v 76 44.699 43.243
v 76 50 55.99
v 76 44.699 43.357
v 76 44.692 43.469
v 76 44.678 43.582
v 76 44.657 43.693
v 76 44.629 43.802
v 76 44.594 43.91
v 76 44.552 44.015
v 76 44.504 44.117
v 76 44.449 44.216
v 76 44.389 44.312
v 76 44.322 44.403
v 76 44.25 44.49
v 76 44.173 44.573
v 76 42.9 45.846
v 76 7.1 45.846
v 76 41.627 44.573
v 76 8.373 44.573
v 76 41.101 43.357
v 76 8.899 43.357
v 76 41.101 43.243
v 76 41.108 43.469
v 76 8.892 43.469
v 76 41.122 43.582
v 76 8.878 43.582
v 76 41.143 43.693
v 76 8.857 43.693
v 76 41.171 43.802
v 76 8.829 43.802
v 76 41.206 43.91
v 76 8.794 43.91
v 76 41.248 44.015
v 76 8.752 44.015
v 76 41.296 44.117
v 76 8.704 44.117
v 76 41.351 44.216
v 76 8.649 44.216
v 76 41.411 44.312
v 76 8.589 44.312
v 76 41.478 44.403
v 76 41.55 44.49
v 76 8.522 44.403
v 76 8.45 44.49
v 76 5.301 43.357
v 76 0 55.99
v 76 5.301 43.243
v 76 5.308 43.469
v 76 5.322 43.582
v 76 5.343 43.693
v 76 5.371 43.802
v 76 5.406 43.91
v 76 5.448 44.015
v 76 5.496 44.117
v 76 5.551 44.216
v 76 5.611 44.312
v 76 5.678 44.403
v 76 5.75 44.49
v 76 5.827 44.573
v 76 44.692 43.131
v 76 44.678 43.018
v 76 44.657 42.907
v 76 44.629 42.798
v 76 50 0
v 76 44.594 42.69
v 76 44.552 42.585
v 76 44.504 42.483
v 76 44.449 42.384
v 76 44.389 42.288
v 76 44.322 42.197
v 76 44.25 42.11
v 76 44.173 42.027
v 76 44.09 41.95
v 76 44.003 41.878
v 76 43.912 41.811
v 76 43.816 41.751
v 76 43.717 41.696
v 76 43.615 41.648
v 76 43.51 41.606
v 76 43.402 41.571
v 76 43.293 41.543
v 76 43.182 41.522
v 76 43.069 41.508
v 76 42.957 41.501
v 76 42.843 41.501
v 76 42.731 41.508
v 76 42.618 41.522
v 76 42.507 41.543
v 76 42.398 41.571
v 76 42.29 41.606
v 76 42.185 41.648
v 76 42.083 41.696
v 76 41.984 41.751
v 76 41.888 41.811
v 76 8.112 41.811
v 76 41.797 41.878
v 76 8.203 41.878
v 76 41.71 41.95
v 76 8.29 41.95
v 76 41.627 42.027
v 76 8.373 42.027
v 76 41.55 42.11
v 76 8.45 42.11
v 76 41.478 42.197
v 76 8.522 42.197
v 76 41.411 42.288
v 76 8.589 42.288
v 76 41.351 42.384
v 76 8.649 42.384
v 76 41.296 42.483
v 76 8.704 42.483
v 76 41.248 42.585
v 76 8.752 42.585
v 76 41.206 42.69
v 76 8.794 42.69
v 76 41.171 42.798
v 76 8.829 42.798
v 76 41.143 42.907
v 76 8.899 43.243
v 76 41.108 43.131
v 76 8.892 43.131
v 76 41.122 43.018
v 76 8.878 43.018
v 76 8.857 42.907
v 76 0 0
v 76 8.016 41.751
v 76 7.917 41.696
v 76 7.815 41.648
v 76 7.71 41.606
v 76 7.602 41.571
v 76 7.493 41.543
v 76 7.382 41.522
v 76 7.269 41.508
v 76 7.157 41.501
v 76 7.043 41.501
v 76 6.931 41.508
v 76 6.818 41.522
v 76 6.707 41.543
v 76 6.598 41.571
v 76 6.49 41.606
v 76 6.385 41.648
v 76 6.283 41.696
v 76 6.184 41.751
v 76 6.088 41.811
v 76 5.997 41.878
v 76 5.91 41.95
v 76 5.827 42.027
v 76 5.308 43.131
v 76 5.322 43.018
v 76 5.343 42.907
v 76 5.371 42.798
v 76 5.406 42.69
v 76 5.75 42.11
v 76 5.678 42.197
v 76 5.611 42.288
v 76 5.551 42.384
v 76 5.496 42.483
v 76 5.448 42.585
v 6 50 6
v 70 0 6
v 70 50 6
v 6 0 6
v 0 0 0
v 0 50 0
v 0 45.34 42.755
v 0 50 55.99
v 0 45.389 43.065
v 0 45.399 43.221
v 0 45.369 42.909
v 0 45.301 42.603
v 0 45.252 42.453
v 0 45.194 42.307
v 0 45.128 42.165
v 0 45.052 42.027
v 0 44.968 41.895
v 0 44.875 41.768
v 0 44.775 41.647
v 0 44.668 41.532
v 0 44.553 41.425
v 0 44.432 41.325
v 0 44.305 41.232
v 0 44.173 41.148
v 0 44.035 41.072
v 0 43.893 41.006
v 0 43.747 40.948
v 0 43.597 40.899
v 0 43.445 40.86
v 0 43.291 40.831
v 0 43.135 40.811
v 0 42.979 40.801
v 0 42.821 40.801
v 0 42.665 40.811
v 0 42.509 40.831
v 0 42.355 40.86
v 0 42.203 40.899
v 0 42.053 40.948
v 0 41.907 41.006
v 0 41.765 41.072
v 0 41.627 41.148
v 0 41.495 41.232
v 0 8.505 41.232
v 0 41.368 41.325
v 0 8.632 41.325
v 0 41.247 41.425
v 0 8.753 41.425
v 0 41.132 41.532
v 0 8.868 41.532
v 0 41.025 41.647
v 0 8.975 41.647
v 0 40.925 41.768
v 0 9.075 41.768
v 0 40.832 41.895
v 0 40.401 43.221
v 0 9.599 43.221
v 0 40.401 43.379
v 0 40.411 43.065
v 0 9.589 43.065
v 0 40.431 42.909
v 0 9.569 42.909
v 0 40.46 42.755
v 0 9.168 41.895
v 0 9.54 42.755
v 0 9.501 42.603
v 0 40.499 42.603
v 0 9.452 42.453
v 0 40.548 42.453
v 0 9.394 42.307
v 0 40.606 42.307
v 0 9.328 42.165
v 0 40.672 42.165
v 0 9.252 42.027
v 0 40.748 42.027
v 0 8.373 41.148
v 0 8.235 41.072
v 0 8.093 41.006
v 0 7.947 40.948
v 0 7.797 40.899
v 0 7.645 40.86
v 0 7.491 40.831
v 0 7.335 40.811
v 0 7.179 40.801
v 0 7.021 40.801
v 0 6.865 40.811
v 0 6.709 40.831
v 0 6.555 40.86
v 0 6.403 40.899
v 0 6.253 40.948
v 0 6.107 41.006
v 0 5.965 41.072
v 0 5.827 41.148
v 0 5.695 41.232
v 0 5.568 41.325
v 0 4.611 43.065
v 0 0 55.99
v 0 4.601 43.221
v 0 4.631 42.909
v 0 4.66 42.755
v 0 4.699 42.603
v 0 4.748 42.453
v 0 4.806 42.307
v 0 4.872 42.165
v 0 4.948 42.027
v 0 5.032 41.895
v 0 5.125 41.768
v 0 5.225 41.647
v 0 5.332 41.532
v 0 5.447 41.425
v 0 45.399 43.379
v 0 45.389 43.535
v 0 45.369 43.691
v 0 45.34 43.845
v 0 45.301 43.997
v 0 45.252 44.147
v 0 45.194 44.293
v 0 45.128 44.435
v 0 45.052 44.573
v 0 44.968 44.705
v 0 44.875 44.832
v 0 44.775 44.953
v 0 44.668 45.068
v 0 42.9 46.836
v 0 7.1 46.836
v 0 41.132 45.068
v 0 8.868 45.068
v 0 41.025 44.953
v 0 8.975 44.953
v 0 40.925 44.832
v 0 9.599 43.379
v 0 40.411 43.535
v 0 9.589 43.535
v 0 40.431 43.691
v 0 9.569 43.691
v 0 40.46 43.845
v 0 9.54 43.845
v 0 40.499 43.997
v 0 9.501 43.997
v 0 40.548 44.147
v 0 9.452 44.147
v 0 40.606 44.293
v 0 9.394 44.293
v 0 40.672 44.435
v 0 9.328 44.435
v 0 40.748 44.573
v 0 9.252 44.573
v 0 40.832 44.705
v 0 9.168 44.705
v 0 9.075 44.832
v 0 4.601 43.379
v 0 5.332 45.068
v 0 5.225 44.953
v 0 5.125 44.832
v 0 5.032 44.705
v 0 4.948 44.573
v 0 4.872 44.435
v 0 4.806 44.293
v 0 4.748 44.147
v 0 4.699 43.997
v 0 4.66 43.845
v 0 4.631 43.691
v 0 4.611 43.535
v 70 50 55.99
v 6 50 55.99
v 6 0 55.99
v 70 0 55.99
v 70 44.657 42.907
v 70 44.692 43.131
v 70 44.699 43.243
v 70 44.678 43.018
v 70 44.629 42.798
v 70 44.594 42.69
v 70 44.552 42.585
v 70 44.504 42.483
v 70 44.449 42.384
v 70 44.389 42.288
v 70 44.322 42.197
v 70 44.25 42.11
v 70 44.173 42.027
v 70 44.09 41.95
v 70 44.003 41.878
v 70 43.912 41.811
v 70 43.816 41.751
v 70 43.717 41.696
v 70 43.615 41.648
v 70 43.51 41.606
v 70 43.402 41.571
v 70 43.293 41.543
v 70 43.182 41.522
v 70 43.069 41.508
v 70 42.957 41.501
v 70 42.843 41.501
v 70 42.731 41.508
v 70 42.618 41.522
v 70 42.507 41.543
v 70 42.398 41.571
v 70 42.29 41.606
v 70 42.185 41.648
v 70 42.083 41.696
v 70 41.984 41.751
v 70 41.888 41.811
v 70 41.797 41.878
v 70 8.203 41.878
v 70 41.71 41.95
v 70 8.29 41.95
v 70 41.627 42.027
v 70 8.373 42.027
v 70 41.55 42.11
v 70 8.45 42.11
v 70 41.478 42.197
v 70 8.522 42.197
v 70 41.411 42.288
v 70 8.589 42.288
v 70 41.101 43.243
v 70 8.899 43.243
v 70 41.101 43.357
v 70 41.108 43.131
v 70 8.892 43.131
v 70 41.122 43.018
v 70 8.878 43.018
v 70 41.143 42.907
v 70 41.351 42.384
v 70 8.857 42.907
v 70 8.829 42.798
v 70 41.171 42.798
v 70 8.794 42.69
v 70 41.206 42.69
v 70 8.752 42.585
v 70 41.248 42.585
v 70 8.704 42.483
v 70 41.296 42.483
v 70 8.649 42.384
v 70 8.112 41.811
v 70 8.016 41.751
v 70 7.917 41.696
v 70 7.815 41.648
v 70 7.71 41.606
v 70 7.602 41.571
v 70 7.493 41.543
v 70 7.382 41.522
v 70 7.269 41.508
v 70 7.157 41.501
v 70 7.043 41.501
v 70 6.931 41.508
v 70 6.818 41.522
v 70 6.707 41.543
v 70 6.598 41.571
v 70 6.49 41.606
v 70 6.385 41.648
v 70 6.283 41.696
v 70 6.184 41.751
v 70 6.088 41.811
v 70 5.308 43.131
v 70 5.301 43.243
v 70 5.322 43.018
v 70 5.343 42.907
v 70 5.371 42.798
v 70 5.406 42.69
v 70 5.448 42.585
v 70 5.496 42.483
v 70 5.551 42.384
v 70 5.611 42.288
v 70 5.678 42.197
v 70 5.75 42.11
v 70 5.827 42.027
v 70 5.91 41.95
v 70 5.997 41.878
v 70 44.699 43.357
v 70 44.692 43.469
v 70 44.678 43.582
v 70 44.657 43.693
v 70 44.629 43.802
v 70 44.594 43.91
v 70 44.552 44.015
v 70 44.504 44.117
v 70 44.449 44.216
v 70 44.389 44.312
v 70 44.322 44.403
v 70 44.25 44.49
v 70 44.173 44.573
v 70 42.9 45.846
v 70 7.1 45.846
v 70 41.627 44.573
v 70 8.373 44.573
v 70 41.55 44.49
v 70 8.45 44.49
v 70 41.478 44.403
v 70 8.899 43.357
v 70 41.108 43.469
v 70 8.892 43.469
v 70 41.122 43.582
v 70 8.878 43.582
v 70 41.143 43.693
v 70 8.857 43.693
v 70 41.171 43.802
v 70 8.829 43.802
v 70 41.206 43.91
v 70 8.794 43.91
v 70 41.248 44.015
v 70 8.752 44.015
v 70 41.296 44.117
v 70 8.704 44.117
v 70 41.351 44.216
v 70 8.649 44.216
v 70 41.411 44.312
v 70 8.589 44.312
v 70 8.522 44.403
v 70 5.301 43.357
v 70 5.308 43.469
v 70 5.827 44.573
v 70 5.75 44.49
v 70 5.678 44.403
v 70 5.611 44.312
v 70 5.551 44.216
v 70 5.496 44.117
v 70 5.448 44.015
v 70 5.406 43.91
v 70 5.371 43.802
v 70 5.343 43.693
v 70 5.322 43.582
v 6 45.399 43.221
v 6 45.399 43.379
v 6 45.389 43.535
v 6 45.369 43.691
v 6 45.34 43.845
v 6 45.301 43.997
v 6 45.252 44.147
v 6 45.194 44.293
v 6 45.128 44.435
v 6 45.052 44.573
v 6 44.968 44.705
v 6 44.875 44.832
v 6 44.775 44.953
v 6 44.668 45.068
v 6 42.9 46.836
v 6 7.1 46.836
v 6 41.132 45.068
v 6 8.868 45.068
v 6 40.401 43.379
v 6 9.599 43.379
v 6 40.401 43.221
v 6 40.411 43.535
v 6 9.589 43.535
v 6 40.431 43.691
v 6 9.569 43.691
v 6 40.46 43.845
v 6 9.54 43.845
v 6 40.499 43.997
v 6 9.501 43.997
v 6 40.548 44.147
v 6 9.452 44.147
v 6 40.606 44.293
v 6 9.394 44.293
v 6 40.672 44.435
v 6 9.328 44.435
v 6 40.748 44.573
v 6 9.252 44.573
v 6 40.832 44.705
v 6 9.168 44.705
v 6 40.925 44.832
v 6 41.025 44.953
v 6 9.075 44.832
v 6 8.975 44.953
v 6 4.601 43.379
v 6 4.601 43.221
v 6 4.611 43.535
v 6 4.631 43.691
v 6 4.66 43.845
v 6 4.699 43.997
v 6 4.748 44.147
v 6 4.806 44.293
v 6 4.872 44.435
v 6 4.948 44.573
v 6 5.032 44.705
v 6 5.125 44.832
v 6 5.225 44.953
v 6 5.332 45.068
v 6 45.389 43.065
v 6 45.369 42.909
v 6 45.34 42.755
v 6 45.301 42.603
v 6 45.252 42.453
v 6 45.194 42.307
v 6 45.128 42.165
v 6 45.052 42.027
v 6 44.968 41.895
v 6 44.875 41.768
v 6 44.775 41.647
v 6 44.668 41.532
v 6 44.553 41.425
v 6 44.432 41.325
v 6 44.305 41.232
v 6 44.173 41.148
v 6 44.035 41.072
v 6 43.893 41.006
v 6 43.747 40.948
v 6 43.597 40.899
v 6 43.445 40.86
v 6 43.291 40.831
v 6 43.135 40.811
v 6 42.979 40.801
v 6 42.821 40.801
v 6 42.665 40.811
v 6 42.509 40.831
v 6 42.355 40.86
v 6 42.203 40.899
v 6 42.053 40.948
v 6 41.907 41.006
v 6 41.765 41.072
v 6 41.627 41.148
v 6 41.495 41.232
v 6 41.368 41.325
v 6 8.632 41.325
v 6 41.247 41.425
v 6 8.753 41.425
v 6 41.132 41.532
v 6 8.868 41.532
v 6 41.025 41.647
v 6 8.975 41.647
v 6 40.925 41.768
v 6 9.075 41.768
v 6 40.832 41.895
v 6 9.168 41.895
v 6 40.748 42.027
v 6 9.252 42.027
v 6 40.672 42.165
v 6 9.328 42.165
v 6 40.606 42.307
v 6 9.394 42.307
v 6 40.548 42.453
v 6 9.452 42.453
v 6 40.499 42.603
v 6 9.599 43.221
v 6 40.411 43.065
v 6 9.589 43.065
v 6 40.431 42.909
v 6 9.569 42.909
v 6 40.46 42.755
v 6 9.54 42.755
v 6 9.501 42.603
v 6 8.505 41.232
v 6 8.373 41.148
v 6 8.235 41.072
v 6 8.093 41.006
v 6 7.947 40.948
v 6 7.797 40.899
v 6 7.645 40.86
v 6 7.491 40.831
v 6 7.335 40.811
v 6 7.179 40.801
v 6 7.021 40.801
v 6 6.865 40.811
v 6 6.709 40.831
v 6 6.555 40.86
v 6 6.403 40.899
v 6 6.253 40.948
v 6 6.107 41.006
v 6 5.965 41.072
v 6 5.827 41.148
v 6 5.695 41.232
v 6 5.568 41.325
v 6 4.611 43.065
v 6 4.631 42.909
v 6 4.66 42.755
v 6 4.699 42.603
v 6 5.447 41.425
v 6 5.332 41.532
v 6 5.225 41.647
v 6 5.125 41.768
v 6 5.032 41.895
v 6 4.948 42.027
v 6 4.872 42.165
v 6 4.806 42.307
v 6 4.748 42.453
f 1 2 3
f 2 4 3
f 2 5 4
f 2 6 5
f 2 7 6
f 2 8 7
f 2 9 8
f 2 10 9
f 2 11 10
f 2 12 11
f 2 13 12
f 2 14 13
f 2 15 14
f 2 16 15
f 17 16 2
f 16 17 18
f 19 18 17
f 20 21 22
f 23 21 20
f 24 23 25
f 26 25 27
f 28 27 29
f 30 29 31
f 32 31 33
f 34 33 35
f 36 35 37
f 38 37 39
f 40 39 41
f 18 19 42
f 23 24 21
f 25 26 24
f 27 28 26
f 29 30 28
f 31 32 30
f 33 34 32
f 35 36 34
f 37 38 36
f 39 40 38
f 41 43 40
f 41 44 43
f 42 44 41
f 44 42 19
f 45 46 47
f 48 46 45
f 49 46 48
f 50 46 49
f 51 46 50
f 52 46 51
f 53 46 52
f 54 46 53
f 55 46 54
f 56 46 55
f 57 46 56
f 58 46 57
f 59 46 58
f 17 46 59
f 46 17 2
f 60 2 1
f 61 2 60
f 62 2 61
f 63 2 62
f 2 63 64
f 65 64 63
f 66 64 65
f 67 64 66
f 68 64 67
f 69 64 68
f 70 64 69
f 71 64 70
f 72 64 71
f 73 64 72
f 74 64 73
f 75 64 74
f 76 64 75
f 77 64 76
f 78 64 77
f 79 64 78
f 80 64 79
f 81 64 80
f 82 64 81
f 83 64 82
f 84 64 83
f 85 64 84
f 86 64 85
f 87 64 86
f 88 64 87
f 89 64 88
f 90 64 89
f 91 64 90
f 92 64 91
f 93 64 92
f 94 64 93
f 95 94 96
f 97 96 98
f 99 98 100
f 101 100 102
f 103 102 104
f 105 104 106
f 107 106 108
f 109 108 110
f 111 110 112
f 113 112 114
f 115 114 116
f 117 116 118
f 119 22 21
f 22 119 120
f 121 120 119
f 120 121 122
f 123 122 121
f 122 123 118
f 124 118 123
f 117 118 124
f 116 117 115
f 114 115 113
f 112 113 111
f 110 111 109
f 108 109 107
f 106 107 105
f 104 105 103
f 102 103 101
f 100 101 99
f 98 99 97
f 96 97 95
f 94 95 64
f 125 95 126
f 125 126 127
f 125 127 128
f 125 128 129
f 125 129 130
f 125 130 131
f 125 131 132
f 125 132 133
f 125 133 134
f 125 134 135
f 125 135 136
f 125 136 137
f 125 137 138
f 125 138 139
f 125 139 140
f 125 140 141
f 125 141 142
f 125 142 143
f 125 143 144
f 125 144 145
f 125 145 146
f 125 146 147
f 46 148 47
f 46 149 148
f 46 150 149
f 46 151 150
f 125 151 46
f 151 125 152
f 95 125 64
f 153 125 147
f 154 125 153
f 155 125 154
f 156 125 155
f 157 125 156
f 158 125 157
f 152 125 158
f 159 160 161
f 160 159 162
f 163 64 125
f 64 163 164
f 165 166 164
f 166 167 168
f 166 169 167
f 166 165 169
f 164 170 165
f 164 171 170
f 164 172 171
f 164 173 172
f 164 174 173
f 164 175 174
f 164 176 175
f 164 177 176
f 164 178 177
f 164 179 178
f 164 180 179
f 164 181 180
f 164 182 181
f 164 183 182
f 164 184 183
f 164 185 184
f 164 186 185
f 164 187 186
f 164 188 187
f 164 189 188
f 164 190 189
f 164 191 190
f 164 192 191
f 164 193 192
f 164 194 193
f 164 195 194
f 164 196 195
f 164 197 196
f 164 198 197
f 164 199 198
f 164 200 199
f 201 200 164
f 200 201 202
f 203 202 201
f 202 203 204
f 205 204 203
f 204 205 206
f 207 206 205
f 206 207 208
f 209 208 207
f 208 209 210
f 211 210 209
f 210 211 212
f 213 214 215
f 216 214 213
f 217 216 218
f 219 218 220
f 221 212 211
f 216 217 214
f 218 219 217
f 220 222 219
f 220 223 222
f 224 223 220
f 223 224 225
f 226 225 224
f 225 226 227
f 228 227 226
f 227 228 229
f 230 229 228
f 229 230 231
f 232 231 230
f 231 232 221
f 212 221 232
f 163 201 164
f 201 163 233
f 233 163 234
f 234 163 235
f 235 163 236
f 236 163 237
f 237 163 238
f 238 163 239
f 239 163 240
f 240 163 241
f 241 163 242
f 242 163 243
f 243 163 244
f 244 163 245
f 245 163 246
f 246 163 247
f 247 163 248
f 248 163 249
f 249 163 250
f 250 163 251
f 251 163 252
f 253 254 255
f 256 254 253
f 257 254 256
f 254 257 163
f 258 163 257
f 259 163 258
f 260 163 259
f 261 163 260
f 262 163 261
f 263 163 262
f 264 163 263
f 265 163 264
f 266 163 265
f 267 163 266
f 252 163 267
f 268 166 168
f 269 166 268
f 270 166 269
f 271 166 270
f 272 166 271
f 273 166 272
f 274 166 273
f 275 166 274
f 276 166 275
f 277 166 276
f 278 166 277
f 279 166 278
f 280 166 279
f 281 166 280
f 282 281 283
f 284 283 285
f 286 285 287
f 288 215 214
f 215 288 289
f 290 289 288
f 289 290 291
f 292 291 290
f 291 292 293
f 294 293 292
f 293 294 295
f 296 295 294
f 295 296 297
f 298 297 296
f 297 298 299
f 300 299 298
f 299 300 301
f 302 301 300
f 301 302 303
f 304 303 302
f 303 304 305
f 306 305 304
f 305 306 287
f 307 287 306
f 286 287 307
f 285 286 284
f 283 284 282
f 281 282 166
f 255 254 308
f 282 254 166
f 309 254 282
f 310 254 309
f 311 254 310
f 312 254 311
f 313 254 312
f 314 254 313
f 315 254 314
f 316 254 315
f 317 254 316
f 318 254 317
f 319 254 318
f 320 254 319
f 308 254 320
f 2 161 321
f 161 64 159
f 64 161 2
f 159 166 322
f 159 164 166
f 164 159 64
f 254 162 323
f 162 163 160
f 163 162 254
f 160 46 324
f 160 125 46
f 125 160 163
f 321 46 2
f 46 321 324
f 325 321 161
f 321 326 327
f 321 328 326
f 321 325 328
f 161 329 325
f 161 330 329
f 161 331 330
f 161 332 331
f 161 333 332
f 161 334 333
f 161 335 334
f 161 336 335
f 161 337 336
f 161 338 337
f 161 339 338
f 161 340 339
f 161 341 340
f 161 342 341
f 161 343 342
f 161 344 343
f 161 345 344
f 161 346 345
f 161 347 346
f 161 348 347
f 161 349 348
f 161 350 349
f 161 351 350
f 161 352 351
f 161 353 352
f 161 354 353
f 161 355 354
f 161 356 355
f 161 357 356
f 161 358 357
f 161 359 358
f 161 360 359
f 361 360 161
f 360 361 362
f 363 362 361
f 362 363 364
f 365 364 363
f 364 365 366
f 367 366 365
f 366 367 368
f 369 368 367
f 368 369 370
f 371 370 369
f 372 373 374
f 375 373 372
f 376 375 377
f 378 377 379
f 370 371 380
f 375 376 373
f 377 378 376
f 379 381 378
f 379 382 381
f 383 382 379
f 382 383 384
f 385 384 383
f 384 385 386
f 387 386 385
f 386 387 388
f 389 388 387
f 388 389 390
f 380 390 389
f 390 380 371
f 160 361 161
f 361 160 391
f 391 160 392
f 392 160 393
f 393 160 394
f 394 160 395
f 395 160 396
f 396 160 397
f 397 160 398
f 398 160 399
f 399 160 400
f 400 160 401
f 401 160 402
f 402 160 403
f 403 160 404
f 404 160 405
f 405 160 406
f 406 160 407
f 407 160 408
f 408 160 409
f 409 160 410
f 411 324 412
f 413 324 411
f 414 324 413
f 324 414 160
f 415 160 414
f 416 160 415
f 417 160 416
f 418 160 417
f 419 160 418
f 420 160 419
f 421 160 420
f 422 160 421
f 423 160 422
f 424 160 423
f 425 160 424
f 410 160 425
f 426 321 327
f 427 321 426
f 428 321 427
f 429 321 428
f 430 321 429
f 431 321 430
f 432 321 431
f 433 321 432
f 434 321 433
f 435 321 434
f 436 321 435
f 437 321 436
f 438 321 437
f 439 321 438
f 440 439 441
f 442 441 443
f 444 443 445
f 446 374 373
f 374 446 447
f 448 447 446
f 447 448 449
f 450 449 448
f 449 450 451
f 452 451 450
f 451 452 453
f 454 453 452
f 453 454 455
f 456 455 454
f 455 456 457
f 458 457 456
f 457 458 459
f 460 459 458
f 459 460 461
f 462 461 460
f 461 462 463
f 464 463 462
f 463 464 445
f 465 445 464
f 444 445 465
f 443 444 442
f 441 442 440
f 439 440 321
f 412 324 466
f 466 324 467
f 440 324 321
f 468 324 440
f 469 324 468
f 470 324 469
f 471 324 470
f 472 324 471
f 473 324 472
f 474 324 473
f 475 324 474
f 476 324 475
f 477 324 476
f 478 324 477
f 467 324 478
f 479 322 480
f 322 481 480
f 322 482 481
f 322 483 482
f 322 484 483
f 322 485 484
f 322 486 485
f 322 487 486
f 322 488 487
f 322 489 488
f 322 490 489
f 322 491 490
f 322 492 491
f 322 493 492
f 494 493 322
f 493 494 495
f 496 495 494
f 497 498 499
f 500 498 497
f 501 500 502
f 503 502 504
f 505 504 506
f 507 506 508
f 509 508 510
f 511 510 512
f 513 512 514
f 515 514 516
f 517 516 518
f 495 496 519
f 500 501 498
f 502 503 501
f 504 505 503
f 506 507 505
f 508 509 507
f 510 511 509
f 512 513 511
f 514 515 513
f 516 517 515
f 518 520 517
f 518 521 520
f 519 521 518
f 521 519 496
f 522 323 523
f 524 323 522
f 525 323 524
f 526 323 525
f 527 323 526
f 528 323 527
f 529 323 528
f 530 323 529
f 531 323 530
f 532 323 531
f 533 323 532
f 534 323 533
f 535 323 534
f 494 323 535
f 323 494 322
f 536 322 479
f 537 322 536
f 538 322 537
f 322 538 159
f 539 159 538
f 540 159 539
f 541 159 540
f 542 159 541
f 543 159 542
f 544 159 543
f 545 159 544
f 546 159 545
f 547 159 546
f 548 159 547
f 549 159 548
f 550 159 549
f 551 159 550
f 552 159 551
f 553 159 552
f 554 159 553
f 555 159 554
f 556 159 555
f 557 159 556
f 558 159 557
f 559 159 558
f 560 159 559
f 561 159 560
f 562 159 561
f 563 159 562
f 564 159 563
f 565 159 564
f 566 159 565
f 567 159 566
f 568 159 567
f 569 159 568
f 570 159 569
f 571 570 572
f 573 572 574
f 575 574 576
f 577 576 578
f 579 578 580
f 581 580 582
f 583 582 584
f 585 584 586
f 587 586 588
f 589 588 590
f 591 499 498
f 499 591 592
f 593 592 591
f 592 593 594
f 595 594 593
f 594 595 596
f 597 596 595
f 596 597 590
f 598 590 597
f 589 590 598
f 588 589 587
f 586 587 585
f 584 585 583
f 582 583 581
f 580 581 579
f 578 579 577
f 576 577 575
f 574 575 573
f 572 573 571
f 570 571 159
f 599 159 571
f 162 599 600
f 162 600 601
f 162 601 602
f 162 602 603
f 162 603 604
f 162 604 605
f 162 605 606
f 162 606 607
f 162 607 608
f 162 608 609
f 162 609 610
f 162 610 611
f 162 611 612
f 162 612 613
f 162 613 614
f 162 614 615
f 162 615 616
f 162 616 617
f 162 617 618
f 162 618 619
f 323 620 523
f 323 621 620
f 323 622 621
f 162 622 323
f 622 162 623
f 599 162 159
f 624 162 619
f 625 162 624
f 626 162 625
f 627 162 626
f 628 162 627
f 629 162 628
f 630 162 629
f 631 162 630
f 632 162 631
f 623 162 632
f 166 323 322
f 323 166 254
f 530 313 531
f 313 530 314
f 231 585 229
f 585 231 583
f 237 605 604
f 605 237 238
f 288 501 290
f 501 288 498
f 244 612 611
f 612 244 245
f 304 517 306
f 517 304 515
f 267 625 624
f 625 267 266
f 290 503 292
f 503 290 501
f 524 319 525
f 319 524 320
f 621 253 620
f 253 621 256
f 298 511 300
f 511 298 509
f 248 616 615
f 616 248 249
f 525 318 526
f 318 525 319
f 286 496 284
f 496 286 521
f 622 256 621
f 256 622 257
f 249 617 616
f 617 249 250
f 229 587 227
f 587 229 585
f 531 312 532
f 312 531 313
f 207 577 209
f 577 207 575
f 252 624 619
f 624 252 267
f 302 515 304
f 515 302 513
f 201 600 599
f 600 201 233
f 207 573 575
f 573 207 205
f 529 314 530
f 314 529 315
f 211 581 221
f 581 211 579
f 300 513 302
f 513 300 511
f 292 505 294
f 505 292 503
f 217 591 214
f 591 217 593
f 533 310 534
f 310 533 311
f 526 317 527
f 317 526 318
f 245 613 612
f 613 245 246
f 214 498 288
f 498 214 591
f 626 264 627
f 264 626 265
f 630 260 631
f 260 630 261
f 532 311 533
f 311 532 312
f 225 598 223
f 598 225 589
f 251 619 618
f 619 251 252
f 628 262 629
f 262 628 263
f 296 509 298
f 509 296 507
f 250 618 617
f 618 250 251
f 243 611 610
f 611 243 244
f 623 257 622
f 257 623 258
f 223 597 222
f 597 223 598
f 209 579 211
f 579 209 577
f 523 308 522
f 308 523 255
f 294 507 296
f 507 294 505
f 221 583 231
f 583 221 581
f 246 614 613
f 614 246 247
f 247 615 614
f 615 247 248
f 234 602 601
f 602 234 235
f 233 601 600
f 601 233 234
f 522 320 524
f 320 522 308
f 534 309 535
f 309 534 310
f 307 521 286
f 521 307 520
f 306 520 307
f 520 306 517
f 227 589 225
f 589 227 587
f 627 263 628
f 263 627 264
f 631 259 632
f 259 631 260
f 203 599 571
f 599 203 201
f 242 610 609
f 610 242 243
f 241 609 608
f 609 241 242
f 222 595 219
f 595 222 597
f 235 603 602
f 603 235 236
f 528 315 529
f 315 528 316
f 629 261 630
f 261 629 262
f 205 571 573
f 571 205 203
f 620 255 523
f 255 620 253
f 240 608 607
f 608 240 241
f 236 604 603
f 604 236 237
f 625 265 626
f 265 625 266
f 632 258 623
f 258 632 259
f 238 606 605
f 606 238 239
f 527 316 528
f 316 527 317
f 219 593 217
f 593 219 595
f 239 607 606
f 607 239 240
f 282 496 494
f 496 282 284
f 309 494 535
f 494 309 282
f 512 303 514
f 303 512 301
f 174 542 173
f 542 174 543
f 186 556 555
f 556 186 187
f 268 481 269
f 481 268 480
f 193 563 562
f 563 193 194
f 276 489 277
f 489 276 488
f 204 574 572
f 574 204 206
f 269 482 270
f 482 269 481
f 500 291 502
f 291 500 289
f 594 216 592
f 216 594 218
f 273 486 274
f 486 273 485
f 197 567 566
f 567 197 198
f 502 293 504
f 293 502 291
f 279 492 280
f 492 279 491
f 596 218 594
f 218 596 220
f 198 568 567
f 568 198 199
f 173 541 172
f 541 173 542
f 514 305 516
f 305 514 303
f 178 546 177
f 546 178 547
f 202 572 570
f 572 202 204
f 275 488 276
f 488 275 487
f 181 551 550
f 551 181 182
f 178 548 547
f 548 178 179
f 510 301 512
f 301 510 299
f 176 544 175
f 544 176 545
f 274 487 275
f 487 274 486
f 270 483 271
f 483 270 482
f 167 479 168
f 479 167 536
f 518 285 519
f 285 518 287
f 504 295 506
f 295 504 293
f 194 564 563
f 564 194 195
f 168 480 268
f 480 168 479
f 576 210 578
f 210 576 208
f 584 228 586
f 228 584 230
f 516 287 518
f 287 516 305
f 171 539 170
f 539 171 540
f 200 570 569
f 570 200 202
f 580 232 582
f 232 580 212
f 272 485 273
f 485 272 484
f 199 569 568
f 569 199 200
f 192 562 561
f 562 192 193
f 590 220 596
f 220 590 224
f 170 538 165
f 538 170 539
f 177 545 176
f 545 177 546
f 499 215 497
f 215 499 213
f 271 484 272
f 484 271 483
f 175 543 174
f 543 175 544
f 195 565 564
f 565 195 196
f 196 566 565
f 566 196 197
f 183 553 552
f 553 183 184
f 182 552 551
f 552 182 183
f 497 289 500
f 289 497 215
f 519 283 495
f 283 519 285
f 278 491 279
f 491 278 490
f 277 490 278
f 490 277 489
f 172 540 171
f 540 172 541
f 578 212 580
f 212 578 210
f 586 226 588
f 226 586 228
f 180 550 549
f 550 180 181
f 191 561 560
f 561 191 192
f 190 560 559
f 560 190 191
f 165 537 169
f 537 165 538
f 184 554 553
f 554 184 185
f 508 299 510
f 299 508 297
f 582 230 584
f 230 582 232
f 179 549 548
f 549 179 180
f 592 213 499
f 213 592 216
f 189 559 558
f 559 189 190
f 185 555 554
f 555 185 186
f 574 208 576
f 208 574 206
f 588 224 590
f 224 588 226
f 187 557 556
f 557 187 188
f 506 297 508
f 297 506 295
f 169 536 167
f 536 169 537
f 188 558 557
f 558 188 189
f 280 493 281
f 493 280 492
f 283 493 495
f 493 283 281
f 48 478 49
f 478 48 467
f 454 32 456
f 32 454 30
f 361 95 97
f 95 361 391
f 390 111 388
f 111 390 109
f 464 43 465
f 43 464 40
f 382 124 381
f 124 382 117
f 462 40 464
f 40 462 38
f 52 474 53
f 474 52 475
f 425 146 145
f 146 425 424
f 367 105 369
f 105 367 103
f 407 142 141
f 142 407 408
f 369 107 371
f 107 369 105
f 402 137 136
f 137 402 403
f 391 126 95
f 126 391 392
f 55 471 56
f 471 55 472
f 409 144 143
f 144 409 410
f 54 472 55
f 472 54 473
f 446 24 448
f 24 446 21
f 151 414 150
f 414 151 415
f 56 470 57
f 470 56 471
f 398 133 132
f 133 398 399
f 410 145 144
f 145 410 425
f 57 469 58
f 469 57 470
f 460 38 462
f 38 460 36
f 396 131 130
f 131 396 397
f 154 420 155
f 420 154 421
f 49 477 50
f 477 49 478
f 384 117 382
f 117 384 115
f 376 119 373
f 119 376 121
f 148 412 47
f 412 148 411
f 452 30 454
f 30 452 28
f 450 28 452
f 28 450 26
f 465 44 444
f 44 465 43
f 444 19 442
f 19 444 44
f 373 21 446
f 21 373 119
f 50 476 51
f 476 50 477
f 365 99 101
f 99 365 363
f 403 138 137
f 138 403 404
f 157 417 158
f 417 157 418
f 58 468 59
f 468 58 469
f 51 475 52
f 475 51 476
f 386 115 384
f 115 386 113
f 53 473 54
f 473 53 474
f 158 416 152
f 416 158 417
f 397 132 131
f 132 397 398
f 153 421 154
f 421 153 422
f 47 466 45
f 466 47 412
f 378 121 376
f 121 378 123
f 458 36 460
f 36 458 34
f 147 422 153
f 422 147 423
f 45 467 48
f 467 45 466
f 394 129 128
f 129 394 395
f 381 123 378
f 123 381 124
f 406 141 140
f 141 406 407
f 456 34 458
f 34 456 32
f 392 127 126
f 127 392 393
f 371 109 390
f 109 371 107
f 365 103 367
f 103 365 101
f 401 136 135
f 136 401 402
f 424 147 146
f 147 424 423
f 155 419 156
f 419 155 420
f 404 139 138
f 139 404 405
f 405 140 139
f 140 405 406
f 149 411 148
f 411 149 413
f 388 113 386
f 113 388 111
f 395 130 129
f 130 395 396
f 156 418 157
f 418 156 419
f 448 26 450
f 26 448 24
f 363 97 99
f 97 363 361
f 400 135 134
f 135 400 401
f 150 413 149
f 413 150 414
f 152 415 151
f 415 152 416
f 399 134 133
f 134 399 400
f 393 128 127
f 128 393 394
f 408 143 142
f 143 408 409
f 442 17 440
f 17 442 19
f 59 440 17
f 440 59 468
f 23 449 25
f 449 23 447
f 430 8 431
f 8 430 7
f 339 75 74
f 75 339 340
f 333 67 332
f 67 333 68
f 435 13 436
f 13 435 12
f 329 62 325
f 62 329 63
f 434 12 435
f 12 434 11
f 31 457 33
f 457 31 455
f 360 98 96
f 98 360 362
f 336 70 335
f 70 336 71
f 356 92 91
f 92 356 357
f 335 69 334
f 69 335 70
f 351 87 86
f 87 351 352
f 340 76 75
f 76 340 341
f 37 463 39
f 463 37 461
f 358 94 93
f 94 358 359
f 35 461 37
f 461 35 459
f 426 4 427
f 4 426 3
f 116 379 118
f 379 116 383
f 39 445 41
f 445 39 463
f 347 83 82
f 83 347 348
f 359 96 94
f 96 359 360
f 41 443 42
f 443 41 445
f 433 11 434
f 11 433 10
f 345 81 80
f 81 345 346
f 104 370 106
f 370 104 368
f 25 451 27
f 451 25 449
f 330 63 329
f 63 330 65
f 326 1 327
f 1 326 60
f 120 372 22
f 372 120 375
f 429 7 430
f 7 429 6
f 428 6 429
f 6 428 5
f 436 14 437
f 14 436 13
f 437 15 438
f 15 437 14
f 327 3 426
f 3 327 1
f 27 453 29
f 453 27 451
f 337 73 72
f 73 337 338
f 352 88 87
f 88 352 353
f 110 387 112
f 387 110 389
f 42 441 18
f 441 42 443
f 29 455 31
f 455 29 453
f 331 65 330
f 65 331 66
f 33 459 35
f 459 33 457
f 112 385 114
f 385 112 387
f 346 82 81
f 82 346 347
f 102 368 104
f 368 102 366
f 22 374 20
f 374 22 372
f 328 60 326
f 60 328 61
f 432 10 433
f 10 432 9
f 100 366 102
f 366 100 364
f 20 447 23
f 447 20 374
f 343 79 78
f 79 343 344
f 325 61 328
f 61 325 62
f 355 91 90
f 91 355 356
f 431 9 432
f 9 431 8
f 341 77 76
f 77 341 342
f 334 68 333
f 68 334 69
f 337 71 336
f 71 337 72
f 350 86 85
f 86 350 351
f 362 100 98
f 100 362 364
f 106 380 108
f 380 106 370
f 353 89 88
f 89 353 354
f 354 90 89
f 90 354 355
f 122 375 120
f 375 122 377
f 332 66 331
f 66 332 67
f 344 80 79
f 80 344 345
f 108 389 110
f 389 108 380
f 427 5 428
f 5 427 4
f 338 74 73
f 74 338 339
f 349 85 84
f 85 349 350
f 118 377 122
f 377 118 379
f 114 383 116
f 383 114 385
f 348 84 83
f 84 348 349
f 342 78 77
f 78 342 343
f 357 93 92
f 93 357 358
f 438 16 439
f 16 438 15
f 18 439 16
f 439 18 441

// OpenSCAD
// bracket to attach the drive wheel to the rest of the rig
$fn = 100;
FUDGE = 0.01;
thickness = 6;
width = 50;
arm = 76;
mountHoleOuter = 39.4;
dia = 3.6;
inFromArm = 14.5;

// Let's call it a hole with print relief
module holePR(d, l) {
    union() {
        cylinder(h=l, d=d, center=true);
        translate([0,0,-l/2])
            cube([d/2,d/2,l], center=false);
    }
}

difference(){
    // The bracket
    union() {
        cube([arm,50,thickness], center=false);
        translate([arm-thickness,0,thickness-FUDGE])
            cube([thickness,50,50], center=false);
        translate([0,0,thickness-FUDGE])
            cube([thickness,50,50], center=false);
    }
    // Holes for screws
    translate([thickness/2,(width-mountHoleOuter)/2+dia/2,
                (width-inFromArm)+thickness+dia/2])
        rotate([90,-45,90])
            holePR(d=dia+1.4, l=thickness+FUDGE);
    translate([thickness/2,
                (width-(width-mountHoleOuter)/2)-dia/2,
                (width-inFromArm)+thickness+dia/2])
        rotate([90,-45,90])
            holePR(d=dia+1.4, l=thickness+FUDGE);
    translate([arm-thickness/2,(width-mountHoleOuter)/2+dia/2,
                (width-inFromArm)+thickness+dia/2])
        rotate([90,-45,90])
            holePR(d=dia, l=thickness+FUDGE);
    translate([arm-thickness/2,
                (width-(width-mountHoleOuter)/2)-dia/2,
                (width-inFromArm)+thickness+dia/2])
        rotate([90,-45,90])
            holePR(d=dia, l=thickness+FUDGE);
}
